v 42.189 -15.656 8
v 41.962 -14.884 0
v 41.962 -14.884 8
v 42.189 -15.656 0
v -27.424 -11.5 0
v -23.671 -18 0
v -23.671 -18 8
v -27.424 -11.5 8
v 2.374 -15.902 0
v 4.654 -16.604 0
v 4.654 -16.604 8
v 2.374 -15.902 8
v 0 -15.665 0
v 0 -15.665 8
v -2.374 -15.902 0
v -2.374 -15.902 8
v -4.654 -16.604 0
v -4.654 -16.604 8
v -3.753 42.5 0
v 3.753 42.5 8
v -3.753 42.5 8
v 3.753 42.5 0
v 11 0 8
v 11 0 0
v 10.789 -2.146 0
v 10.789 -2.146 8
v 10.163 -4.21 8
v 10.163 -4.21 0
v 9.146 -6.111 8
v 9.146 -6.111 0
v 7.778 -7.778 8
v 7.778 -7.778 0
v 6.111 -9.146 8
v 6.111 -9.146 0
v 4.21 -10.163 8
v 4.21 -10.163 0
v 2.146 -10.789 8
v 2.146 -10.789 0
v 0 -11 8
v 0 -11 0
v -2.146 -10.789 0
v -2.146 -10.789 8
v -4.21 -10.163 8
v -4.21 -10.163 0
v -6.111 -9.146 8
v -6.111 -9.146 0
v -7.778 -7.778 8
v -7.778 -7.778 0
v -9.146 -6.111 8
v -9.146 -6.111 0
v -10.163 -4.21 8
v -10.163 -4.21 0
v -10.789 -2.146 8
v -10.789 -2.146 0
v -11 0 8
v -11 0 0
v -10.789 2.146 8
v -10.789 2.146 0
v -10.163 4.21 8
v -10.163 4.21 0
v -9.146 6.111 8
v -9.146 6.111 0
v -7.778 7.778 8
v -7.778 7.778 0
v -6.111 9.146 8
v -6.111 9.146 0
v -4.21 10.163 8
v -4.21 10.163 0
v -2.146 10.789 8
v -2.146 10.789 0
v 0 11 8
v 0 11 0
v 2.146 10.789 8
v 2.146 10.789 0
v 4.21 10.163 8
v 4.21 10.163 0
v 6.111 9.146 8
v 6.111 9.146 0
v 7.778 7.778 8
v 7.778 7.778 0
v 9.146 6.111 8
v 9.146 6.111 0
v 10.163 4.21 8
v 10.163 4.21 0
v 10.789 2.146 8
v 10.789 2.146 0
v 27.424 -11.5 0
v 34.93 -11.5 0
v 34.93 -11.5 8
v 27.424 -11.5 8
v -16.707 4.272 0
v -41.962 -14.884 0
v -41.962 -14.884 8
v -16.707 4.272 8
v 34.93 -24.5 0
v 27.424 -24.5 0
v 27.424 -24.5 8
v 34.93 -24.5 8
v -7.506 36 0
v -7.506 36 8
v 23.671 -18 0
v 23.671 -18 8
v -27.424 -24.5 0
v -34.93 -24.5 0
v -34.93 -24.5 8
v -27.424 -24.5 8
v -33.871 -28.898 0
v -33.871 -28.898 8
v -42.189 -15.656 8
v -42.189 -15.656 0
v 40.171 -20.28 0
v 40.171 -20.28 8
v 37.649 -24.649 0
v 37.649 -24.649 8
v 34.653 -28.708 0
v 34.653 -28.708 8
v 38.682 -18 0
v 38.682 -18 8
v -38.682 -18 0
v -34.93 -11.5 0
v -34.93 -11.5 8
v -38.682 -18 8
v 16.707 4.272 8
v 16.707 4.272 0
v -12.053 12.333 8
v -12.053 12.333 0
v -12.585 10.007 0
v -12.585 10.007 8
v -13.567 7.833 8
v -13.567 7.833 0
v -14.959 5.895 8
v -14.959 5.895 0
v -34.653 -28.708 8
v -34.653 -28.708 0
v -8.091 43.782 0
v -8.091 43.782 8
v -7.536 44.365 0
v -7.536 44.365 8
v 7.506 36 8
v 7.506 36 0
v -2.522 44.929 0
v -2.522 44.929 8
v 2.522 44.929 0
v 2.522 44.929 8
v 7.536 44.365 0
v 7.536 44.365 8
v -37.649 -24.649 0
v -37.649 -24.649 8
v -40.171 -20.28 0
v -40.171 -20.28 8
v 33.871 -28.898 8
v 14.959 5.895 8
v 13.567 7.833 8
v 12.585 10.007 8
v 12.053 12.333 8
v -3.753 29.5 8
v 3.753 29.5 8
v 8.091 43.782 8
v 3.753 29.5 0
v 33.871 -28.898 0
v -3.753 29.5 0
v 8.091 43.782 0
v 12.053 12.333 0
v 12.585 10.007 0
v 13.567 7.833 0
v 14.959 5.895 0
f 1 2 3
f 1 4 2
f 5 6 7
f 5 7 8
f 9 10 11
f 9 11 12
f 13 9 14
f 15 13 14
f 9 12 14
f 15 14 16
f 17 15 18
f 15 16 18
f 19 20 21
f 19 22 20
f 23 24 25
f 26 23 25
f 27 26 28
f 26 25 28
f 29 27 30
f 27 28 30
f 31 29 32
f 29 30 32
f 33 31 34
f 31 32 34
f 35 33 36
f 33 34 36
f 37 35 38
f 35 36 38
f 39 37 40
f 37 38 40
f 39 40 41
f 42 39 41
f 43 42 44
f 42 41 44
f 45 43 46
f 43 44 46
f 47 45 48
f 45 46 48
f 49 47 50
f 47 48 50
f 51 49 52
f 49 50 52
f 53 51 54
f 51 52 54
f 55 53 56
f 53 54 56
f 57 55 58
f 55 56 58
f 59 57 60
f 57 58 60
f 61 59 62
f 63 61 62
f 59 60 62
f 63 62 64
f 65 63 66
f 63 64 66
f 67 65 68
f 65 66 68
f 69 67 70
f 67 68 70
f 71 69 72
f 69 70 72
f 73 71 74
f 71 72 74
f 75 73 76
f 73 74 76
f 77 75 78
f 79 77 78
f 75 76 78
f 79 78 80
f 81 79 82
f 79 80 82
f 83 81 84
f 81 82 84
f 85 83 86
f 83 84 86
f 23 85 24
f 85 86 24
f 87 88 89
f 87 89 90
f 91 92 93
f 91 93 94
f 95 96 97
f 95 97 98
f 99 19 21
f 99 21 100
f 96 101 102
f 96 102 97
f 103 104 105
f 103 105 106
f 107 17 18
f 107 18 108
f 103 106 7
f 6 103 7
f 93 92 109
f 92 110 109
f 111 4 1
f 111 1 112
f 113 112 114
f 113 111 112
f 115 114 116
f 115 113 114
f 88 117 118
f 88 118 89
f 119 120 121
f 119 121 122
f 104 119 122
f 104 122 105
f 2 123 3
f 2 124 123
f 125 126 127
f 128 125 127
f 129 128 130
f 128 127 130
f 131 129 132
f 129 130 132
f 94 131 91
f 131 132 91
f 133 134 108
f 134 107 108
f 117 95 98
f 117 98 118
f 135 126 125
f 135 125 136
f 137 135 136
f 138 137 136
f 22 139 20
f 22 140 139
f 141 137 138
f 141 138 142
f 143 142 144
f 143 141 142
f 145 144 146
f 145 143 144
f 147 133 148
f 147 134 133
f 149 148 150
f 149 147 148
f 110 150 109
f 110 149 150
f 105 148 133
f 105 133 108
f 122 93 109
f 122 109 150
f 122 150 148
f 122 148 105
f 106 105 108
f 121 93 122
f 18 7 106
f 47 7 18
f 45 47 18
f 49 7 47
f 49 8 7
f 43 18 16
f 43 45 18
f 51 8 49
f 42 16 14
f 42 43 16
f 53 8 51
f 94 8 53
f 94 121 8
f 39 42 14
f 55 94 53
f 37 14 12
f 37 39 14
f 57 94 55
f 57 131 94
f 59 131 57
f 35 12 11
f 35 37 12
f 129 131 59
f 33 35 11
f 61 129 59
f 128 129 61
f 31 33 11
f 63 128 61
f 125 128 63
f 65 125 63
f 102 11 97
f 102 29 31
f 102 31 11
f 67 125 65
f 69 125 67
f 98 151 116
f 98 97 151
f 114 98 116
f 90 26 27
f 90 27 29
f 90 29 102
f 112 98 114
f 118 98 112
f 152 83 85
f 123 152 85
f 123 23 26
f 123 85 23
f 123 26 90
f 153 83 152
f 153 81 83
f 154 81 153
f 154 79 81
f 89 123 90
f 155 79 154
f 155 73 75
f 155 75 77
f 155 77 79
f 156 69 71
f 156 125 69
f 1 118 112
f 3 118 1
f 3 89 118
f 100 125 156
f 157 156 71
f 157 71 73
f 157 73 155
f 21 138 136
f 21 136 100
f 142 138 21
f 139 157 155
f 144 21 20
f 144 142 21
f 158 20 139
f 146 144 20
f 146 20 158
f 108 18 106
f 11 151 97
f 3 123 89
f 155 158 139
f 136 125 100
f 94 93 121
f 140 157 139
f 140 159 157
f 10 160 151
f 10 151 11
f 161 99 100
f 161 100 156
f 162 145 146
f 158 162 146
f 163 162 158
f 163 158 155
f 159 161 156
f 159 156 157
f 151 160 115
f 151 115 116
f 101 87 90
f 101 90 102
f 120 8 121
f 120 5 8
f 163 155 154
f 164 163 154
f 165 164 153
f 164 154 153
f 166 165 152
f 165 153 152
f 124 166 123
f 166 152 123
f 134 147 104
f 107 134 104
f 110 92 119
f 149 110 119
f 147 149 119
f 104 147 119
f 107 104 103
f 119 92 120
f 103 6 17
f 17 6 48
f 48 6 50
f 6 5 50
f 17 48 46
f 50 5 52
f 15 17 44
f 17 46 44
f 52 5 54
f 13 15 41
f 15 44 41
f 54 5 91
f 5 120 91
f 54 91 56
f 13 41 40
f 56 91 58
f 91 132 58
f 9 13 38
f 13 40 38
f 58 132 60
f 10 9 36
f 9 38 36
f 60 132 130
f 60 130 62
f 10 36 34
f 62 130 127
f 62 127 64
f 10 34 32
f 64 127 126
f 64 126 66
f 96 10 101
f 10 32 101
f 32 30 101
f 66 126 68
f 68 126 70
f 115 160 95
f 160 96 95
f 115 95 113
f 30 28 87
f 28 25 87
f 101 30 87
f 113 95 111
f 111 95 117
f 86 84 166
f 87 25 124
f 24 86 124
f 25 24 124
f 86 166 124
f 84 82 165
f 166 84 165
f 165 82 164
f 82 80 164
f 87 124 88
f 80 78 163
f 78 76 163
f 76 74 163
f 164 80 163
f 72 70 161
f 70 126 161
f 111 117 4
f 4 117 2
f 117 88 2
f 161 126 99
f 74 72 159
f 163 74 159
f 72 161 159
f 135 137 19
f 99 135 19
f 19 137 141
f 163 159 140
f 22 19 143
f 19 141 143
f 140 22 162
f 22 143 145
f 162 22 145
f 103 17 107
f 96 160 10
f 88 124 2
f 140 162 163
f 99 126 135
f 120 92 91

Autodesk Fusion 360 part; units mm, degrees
sketch "Sketch1" plane through (0, 0, 0) normal (0, 0, 1) x (1, 0, 0)
  circle A0 centre (0, 0) radius 45
  circle A1 centre (0, 0) radius 11
  circle A2 centre (0, 0) radius 4
  circle A3 centre (0, 0) radius 13.5
  line L0 (7.5056, 36) -> (3.7528, 42.5)
  line L1 (3.7528, 42.5) -> (-3.7528, 42.5)
  line L2 (-3.7528, 42.5) -> (-7.5056, 36)
  line L3 (-7.5056, 36) -> (-3.7528, 29.5)
  line L4 (-3.7528, 29.5) -> (3.7528, 29.5)
  line L5 (3.7528, 29.5) -> (7.5056, 36)
  line L6 (0, 0) -> (0, 29.5) construction
  circle A4 centre (0, 36) radius 9 construction
  line L7 (-13.3941, 1.6875) -> (-8.0282, 44.2781)
  line L8 (8.0282, 44.2781) -> (13.3941, 1.6875)
  point P0 (0, 36)
  dimension "d1" = 90
  dimension "d2" = 22
  dimension "d3" = 8
  dimension "d4" = 2.5
  dimension "d5" = 6.5
  dimension "d6" = 29.5
extrude "Extrude1" add sketch "Sketch1" along normal blind 8 contours A0 A3 L7 L8 | A3 picked at (0, 24.1667) makes body 1
pattern_circular "C-Pattern1" count 3 over 360 about axis through (0, 0, 1.75) along (0, 0, 1) of bodies 1 makes body 2 at (-20.0614, -11.8988, 0) makes body 3 at (20.3354, -11.4242, 0)
combine "Combine1" operation add target body 1 tool bodies 3 2
fillet "Fillet1" radius 12 3 edges at (12.6841, 7.3232, 4) (-12.6841, 7.3232, 4) (0, -14.6463, 4) on bodies 1
chamfer "Chamfer1" distance 0.5 angle 45 6 edges at (-8.0282, 44.2781, 4) (8.0282, 44.2781, 4) (42.36, -15.1864, 4) (-42.36, -15.1864, 4) (-34.3318, -29.0917, 4) (34.3318, -29.0917, 4) on bodies 1
